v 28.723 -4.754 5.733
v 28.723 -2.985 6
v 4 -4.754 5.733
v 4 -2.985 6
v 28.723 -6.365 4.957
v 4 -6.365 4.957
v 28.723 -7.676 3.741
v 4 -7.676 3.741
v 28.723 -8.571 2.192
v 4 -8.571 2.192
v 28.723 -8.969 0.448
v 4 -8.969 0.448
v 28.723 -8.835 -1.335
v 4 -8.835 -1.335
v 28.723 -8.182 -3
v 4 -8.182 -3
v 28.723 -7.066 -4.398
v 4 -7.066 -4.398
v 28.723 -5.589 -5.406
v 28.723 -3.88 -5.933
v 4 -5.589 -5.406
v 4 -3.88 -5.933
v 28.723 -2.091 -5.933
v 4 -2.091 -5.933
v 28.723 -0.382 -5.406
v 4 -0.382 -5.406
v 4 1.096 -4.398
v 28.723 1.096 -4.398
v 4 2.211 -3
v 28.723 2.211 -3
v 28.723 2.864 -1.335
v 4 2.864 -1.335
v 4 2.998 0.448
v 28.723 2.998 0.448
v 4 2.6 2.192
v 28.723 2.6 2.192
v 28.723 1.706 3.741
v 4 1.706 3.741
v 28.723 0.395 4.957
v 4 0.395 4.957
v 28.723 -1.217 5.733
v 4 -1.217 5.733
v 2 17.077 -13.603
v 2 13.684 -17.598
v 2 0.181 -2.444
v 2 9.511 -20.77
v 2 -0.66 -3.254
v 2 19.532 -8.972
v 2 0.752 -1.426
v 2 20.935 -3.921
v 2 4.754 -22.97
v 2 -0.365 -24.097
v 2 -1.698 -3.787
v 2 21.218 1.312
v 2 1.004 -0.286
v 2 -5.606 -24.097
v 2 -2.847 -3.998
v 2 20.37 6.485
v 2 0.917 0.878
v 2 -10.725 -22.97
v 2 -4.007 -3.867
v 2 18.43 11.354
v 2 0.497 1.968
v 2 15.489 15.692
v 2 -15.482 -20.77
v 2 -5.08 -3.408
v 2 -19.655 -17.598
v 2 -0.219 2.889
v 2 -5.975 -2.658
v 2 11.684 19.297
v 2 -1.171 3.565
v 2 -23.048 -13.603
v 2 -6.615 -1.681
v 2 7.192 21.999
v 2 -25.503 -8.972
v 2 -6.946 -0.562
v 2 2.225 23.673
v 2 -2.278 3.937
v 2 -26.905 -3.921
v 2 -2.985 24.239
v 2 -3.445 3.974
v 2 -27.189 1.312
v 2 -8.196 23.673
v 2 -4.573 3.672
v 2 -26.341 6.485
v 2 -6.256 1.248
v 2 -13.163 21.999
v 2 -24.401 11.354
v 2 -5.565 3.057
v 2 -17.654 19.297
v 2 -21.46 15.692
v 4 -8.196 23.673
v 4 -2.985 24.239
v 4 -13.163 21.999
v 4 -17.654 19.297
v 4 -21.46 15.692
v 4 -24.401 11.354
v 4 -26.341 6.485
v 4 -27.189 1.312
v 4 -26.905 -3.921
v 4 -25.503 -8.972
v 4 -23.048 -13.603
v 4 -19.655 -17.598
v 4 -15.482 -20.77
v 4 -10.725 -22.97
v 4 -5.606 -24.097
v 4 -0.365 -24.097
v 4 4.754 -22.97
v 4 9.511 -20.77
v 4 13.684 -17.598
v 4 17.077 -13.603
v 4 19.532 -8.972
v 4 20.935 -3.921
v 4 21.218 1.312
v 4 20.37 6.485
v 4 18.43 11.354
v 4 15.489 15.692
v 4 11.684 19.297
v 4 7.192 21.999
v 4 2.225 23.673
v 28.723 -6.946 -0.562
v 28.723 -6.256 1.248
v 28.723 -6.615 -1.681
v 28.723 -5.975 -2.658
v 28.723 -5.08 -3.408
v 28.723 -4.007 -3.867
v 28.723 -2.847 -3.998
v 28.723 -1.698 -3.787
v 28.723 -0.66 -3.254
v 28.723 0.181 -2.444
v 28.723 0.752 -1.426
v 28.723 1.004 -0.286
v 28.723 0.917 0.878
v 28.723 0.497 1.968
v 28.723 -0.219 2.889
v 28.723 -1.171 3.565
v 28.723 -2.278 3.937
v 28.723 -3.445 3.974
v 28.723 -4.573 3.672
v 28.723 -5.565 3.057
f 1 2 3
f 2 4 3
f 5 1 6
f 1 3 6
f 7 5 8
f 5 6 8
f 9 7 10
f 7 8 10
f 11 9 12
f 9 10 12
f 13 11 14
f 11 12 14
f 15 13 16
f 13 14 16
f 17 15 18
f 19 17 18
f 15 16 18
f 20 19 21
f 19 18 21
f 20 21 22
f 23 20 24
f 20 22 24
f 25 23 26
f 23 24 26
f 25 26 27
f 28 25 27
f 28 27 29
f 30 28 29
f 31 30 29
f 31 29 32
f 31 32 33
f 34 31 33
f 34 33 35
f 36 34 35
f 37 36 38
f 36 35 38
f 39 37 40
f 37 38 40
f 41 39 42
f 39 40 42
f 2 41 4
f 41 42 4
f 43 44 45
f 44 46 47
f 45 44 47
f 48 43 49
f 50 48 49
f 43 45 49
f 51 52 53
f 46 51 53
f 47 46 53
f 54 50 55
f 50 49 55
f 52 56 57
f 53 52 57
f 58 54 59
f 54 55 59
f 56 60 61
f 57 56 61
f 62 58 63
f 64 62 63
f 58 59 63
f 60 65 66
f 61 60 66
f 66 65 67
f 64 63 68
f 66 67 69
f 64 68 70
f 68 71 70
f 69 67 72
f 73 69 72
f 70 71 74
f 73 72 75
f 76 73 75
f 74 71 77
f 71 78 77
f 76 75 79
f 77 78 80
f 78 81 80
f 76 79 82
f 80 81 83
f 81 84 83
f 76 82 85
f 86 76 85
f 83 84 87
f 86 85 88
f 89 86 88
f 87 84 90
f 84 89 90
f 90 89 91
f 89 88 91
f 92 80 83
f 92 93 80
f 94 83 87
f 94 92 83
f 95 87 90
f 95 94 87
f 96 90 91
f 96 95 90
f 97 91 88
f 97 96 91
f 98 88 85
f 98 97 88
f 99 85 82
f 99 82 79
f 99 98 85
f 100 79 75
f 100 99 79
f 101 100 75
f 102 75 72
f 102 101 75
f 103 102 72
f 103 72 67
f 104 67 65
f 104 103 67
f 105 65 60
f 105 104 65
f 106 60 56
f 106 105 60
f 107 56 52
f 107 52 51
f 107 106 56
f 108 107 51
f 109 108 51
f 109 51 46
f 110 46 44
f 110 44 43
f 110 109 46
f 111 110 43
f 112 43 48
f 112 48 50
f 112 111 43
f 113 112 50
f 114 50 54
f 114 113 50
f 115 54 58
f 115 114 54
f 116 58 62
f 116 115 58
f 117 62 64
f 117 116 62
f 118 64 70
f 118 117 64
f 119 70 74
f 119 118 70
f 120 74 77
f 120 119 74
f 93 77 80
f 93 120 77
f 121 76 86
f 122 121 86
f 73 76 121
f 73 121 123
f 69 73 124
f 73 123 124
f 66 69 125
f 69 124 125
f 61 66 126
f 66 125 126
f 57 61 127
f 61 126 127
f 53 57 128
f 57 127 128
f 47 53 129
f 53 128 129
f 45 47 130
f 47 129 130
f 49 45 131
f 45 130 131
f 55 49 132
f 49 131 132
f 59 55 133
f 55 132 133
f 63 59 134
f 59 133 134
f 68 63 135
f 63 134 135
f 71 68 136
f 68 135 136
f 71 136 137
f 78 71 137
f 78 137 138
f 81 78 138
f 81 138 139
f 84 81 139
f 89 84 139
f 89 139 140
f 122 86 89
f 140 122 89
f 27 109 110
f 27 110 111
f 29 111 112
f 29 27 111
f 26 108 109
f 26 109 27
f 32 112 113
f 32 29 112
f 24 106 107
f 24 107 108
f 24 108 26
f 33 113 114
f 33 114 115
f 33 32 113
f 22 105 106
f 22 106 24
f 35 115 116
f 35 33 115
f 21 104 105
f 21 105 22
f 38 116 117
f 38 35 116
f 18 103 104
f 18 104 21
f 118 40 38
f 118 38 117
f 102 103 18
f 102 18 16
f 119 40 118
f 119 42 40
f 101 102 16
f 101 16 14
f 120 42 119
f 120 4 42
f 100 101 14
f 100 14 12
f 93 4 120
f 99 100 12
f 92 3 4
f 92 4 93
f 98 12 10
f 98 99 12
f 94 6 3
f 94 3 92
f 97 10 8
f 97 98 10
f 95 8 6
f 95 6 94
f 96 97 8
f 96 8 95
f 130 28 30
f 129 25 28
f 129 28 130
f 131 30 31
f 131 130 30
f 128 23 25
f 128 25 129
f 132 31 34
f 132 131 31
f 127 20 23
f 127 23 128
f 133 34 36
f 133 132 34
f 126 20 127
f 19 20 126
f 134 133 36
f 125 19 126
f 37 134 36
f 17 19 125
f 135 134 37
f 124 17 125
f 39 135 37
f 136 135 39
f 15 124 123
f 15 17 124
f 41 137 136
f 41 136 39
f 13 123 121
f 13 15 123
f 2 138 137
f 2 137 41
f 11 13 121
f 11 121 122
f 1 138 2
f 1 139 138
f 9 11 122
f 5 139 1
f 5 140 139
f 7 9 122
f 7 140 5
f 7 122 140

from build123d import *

# Parameters (mm, degrees)
BOSS_EXTRUDE1_DEPTH = 26.722785591


with BuildPart() as part:
    # Sketch1 → Revolve1 (revolve)
    with BuildSketch(Plane.XY, mode=Mode.PRIVATE) as revolve1_sk:
        Polygon((2, 5.01459854), (2, 21.253819403), (4, 21.253819403), (4, 3.01459854), (7, 3.01459854), (28.722785591, 3.01459854), (28.722785591, 1.01459854), (7, 1.01459854), (2, 1.01459854), align=None)
    revolve(revolve1_sk.sketch.rotate(Axis((2, -2.98540146, 0), (1, 0, 0)), 90), axis=Axis((2, -2.98540146, 0), (1, 0, 0)))

    # Sketch2 → Boss-Extrude1 (add)
    with BuildSketch(Plane.ZY.offset(-2)):
        with BuildLine():
            Line((-0.561713132, -6.945764872), (1.247578239, -6.255500623))
            Line((1.247578239, -6.255500623), (3.056869611, -5.565236374))
            ThreePointArc((3.056869611, -5.565236374), (1.425803702, -6.722657646), (-0.561713132, -6.945764872))
        make_face()
    extrude(amount=-BOSS_EXTRUDE1_DEPTH)


solid = part.part
